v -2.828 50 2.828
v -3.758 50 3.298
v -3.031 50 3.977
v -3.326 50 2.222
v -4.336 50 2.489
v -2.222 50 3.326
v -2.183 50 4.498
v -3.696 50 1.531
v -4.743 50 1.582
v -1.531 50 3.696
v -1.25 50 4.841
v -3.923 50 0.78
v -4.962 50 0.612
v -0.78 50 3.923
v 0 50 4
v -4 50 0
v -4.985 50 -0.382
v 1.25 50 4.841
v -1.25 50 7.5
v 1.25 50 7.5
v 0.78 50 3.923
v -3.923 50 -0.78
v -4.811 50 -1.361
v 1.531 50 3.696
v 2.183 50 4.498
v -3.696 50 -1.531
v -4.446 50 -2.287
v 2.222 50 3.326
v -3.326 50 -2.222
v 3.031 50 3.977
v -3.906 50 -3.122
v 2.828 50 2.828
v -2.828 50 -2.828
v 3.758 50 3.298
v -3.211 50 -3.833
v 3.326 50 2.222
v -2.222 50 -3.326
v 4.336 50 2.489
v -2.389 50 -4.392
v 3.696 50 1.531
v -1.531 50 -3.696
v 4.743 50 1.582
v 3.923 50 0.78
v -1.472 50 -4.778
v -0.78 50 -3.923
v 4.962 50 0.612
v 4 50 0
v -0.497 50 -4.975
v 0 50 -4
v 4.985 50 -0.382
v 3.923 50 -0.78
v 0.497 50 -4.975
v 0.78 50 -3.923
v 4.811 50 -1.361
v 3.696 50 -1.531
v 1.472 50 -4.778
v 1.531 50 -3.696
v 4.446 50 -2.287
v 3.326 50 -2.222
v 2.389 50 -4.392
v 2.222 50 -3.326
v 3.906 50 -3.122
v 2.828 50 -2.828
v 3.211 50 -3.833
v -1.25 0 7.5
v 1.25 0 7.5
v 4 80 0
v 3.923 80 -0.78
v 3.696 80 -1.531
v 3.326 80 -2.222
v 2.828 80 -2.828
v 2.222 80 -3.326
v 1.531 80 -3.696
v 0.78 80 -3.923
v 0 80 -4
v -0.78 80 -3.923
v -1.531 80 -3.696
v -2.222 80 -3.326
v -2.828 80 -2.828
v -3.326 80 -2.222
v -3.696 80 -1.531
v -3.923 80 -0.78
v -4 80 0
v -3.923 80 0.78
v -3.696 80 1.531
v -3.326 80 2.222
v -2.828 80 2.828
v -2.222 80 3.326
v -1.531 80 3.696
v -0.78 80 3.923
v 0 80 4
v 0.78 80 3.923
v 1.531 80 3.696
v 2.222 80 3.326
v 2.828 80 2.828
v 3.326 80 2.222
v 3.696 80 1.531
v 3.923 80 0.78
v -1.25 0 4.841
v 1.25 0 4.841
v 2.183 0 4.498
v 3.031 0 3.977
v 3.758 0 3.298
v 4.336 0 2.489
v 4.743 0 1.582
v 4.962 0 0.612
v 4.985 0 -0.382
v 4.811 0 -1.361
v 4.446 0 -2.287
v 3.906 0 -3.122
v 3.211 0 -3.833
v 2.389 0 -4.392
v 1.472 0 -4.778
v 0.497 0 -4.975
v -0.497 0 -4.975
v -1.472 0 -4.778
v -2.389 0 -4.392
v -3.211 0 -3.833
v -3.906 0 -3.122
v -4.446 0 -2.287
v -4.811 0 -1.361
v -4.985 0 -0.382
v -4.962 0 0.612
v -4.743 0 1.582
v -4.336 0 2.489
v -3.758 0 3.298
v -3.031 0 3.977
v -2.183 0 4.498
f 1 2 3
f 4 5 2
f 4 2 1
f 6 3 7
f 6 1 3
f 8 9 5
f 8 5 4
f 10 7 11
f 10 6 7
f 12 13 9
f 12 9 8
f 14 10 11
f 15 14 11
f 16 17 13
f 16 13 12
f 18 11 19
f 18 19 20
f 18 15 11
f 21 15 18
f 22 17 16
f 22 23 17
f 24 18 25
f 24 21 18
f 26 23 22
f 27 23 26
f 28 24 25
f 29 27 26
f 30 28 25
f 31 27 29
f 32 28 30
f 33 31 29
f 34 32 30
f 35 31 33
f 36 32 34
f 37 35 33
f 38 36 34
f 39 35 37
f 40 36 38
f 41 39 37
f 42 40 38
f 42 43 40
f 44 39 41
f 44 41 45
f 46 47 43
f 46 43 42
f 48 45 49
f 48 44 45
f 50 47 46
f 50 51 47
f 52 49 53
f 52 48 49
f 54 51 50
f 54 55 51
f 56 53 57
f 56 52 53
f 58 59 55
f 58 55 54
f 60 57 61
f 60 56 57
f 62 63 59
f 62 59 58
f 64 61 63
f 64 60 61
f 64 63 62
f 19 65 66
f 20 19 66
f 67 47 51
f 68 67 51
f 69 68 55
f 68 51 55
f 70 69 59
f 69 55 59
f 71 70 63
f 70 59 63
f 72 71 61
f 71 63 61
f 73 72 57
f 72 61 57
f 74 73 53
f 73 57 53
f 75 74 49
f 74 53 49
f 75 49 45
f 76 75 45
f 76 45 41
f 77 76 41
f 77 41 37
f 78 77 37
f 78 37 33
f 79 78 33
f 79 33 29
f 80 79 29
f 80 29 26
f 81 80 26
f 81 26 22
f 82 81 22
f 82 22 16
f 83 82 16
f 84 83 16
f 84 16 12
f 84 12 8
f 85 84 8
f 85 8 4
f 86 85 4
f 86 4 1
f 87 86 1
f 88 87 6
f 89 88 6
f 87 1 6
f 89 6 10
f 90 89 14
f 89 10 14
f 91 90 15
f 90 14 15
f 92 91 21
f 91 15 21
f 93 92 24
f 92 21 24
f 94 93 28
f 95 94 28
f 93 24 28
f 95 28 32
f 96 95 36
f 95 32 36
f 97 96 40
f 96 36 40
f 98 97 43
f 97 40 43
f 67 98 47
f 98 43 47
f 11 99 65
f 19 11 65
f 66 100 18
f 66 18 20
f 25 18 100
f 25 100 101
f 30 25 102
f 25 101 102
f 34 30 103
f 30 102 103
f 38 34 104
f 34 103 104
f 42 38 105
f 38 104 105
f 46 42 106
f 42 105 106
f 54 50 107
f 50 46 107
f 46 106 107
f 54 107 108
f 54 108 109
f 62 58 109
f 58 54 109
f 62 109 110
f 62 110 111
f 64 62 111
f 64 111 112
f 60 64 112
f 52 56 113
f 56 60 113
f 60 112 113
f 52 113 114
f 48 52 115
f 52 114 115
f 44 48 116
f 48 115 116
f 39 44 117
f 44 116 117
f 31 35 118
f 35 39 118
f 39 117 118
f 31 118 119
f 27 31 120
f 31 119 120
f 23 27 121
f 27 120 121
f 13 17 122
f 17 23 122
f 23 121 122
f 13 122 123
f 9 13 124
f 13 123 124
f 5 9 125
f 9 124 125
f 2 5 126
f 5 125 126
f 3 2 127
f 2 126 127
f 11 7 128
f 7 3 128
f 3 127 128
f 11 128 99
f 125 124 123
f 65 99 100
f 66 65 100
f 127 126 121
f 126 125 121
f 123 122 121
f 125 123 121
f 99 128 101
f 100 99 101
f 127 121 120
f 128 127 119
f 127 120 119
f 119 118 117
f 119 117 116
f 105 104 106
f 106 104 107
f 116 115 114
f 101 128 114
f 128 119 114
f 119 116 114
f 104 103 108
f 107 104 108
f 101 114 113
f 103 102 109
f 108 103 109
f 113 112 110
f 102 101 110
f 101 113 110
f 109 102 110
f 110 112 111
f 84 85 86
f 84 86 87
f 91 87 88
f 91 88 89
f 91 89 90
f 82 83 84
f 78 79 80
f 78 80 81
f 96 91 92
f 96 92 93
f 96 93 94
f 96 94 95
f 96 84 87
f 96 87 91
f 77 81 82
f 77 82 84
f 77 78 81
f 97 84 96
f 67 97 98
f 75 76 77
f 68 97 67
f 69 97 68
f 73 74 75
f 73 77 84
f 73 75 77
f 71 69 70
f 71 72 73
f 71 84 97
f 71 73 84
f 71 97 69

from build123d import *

# Parameters (mm, degrees)
SKETCH1_R           = 5
BOSS_EXTRUDE1_DEPTH = 50
SKETCH2_R           = 4
BOSS_EXTRUDE2_DEPTH = 30
SKETCH3_W           = 2.5
SKETCH3_H           = 5
BOSS_EXTRUDE3_DEPTH = 50


with BuildPart() as part:
    # Sketch1 → Boss-Extrude1 (new body)
    with BuildSketch(Plane(origin=(0, 0, 0), x_dir=(1, 0, 0), z_dir=(0, 1, 0))):
        Circle(SKETCH1_R)
    extrude(amount=BOSS_EXTRUDE1_DEPTH)

    # Sketch2 → Boss-Extrude2 (add)
    with BuildSketch(Plane(origin=(0, 50, 0), x_dir=(1, 0, 0), z_dir=(0, 1, 0))):
        Circle(SKETCH2_R)
    extrude(amount=BOSS_EXTRUDE2_DEPTH)

    # Sketch3 → Boss-Extrude3 (add)
    with BuildSketch(Plane.XZ):
        with Locations((0, 5)):
            Rectangle(SKETCH3_W, SKETCH3_H)
    extrude(amount=-BOSS_EXTRUDE3_DEPTH)


solid = part.part
